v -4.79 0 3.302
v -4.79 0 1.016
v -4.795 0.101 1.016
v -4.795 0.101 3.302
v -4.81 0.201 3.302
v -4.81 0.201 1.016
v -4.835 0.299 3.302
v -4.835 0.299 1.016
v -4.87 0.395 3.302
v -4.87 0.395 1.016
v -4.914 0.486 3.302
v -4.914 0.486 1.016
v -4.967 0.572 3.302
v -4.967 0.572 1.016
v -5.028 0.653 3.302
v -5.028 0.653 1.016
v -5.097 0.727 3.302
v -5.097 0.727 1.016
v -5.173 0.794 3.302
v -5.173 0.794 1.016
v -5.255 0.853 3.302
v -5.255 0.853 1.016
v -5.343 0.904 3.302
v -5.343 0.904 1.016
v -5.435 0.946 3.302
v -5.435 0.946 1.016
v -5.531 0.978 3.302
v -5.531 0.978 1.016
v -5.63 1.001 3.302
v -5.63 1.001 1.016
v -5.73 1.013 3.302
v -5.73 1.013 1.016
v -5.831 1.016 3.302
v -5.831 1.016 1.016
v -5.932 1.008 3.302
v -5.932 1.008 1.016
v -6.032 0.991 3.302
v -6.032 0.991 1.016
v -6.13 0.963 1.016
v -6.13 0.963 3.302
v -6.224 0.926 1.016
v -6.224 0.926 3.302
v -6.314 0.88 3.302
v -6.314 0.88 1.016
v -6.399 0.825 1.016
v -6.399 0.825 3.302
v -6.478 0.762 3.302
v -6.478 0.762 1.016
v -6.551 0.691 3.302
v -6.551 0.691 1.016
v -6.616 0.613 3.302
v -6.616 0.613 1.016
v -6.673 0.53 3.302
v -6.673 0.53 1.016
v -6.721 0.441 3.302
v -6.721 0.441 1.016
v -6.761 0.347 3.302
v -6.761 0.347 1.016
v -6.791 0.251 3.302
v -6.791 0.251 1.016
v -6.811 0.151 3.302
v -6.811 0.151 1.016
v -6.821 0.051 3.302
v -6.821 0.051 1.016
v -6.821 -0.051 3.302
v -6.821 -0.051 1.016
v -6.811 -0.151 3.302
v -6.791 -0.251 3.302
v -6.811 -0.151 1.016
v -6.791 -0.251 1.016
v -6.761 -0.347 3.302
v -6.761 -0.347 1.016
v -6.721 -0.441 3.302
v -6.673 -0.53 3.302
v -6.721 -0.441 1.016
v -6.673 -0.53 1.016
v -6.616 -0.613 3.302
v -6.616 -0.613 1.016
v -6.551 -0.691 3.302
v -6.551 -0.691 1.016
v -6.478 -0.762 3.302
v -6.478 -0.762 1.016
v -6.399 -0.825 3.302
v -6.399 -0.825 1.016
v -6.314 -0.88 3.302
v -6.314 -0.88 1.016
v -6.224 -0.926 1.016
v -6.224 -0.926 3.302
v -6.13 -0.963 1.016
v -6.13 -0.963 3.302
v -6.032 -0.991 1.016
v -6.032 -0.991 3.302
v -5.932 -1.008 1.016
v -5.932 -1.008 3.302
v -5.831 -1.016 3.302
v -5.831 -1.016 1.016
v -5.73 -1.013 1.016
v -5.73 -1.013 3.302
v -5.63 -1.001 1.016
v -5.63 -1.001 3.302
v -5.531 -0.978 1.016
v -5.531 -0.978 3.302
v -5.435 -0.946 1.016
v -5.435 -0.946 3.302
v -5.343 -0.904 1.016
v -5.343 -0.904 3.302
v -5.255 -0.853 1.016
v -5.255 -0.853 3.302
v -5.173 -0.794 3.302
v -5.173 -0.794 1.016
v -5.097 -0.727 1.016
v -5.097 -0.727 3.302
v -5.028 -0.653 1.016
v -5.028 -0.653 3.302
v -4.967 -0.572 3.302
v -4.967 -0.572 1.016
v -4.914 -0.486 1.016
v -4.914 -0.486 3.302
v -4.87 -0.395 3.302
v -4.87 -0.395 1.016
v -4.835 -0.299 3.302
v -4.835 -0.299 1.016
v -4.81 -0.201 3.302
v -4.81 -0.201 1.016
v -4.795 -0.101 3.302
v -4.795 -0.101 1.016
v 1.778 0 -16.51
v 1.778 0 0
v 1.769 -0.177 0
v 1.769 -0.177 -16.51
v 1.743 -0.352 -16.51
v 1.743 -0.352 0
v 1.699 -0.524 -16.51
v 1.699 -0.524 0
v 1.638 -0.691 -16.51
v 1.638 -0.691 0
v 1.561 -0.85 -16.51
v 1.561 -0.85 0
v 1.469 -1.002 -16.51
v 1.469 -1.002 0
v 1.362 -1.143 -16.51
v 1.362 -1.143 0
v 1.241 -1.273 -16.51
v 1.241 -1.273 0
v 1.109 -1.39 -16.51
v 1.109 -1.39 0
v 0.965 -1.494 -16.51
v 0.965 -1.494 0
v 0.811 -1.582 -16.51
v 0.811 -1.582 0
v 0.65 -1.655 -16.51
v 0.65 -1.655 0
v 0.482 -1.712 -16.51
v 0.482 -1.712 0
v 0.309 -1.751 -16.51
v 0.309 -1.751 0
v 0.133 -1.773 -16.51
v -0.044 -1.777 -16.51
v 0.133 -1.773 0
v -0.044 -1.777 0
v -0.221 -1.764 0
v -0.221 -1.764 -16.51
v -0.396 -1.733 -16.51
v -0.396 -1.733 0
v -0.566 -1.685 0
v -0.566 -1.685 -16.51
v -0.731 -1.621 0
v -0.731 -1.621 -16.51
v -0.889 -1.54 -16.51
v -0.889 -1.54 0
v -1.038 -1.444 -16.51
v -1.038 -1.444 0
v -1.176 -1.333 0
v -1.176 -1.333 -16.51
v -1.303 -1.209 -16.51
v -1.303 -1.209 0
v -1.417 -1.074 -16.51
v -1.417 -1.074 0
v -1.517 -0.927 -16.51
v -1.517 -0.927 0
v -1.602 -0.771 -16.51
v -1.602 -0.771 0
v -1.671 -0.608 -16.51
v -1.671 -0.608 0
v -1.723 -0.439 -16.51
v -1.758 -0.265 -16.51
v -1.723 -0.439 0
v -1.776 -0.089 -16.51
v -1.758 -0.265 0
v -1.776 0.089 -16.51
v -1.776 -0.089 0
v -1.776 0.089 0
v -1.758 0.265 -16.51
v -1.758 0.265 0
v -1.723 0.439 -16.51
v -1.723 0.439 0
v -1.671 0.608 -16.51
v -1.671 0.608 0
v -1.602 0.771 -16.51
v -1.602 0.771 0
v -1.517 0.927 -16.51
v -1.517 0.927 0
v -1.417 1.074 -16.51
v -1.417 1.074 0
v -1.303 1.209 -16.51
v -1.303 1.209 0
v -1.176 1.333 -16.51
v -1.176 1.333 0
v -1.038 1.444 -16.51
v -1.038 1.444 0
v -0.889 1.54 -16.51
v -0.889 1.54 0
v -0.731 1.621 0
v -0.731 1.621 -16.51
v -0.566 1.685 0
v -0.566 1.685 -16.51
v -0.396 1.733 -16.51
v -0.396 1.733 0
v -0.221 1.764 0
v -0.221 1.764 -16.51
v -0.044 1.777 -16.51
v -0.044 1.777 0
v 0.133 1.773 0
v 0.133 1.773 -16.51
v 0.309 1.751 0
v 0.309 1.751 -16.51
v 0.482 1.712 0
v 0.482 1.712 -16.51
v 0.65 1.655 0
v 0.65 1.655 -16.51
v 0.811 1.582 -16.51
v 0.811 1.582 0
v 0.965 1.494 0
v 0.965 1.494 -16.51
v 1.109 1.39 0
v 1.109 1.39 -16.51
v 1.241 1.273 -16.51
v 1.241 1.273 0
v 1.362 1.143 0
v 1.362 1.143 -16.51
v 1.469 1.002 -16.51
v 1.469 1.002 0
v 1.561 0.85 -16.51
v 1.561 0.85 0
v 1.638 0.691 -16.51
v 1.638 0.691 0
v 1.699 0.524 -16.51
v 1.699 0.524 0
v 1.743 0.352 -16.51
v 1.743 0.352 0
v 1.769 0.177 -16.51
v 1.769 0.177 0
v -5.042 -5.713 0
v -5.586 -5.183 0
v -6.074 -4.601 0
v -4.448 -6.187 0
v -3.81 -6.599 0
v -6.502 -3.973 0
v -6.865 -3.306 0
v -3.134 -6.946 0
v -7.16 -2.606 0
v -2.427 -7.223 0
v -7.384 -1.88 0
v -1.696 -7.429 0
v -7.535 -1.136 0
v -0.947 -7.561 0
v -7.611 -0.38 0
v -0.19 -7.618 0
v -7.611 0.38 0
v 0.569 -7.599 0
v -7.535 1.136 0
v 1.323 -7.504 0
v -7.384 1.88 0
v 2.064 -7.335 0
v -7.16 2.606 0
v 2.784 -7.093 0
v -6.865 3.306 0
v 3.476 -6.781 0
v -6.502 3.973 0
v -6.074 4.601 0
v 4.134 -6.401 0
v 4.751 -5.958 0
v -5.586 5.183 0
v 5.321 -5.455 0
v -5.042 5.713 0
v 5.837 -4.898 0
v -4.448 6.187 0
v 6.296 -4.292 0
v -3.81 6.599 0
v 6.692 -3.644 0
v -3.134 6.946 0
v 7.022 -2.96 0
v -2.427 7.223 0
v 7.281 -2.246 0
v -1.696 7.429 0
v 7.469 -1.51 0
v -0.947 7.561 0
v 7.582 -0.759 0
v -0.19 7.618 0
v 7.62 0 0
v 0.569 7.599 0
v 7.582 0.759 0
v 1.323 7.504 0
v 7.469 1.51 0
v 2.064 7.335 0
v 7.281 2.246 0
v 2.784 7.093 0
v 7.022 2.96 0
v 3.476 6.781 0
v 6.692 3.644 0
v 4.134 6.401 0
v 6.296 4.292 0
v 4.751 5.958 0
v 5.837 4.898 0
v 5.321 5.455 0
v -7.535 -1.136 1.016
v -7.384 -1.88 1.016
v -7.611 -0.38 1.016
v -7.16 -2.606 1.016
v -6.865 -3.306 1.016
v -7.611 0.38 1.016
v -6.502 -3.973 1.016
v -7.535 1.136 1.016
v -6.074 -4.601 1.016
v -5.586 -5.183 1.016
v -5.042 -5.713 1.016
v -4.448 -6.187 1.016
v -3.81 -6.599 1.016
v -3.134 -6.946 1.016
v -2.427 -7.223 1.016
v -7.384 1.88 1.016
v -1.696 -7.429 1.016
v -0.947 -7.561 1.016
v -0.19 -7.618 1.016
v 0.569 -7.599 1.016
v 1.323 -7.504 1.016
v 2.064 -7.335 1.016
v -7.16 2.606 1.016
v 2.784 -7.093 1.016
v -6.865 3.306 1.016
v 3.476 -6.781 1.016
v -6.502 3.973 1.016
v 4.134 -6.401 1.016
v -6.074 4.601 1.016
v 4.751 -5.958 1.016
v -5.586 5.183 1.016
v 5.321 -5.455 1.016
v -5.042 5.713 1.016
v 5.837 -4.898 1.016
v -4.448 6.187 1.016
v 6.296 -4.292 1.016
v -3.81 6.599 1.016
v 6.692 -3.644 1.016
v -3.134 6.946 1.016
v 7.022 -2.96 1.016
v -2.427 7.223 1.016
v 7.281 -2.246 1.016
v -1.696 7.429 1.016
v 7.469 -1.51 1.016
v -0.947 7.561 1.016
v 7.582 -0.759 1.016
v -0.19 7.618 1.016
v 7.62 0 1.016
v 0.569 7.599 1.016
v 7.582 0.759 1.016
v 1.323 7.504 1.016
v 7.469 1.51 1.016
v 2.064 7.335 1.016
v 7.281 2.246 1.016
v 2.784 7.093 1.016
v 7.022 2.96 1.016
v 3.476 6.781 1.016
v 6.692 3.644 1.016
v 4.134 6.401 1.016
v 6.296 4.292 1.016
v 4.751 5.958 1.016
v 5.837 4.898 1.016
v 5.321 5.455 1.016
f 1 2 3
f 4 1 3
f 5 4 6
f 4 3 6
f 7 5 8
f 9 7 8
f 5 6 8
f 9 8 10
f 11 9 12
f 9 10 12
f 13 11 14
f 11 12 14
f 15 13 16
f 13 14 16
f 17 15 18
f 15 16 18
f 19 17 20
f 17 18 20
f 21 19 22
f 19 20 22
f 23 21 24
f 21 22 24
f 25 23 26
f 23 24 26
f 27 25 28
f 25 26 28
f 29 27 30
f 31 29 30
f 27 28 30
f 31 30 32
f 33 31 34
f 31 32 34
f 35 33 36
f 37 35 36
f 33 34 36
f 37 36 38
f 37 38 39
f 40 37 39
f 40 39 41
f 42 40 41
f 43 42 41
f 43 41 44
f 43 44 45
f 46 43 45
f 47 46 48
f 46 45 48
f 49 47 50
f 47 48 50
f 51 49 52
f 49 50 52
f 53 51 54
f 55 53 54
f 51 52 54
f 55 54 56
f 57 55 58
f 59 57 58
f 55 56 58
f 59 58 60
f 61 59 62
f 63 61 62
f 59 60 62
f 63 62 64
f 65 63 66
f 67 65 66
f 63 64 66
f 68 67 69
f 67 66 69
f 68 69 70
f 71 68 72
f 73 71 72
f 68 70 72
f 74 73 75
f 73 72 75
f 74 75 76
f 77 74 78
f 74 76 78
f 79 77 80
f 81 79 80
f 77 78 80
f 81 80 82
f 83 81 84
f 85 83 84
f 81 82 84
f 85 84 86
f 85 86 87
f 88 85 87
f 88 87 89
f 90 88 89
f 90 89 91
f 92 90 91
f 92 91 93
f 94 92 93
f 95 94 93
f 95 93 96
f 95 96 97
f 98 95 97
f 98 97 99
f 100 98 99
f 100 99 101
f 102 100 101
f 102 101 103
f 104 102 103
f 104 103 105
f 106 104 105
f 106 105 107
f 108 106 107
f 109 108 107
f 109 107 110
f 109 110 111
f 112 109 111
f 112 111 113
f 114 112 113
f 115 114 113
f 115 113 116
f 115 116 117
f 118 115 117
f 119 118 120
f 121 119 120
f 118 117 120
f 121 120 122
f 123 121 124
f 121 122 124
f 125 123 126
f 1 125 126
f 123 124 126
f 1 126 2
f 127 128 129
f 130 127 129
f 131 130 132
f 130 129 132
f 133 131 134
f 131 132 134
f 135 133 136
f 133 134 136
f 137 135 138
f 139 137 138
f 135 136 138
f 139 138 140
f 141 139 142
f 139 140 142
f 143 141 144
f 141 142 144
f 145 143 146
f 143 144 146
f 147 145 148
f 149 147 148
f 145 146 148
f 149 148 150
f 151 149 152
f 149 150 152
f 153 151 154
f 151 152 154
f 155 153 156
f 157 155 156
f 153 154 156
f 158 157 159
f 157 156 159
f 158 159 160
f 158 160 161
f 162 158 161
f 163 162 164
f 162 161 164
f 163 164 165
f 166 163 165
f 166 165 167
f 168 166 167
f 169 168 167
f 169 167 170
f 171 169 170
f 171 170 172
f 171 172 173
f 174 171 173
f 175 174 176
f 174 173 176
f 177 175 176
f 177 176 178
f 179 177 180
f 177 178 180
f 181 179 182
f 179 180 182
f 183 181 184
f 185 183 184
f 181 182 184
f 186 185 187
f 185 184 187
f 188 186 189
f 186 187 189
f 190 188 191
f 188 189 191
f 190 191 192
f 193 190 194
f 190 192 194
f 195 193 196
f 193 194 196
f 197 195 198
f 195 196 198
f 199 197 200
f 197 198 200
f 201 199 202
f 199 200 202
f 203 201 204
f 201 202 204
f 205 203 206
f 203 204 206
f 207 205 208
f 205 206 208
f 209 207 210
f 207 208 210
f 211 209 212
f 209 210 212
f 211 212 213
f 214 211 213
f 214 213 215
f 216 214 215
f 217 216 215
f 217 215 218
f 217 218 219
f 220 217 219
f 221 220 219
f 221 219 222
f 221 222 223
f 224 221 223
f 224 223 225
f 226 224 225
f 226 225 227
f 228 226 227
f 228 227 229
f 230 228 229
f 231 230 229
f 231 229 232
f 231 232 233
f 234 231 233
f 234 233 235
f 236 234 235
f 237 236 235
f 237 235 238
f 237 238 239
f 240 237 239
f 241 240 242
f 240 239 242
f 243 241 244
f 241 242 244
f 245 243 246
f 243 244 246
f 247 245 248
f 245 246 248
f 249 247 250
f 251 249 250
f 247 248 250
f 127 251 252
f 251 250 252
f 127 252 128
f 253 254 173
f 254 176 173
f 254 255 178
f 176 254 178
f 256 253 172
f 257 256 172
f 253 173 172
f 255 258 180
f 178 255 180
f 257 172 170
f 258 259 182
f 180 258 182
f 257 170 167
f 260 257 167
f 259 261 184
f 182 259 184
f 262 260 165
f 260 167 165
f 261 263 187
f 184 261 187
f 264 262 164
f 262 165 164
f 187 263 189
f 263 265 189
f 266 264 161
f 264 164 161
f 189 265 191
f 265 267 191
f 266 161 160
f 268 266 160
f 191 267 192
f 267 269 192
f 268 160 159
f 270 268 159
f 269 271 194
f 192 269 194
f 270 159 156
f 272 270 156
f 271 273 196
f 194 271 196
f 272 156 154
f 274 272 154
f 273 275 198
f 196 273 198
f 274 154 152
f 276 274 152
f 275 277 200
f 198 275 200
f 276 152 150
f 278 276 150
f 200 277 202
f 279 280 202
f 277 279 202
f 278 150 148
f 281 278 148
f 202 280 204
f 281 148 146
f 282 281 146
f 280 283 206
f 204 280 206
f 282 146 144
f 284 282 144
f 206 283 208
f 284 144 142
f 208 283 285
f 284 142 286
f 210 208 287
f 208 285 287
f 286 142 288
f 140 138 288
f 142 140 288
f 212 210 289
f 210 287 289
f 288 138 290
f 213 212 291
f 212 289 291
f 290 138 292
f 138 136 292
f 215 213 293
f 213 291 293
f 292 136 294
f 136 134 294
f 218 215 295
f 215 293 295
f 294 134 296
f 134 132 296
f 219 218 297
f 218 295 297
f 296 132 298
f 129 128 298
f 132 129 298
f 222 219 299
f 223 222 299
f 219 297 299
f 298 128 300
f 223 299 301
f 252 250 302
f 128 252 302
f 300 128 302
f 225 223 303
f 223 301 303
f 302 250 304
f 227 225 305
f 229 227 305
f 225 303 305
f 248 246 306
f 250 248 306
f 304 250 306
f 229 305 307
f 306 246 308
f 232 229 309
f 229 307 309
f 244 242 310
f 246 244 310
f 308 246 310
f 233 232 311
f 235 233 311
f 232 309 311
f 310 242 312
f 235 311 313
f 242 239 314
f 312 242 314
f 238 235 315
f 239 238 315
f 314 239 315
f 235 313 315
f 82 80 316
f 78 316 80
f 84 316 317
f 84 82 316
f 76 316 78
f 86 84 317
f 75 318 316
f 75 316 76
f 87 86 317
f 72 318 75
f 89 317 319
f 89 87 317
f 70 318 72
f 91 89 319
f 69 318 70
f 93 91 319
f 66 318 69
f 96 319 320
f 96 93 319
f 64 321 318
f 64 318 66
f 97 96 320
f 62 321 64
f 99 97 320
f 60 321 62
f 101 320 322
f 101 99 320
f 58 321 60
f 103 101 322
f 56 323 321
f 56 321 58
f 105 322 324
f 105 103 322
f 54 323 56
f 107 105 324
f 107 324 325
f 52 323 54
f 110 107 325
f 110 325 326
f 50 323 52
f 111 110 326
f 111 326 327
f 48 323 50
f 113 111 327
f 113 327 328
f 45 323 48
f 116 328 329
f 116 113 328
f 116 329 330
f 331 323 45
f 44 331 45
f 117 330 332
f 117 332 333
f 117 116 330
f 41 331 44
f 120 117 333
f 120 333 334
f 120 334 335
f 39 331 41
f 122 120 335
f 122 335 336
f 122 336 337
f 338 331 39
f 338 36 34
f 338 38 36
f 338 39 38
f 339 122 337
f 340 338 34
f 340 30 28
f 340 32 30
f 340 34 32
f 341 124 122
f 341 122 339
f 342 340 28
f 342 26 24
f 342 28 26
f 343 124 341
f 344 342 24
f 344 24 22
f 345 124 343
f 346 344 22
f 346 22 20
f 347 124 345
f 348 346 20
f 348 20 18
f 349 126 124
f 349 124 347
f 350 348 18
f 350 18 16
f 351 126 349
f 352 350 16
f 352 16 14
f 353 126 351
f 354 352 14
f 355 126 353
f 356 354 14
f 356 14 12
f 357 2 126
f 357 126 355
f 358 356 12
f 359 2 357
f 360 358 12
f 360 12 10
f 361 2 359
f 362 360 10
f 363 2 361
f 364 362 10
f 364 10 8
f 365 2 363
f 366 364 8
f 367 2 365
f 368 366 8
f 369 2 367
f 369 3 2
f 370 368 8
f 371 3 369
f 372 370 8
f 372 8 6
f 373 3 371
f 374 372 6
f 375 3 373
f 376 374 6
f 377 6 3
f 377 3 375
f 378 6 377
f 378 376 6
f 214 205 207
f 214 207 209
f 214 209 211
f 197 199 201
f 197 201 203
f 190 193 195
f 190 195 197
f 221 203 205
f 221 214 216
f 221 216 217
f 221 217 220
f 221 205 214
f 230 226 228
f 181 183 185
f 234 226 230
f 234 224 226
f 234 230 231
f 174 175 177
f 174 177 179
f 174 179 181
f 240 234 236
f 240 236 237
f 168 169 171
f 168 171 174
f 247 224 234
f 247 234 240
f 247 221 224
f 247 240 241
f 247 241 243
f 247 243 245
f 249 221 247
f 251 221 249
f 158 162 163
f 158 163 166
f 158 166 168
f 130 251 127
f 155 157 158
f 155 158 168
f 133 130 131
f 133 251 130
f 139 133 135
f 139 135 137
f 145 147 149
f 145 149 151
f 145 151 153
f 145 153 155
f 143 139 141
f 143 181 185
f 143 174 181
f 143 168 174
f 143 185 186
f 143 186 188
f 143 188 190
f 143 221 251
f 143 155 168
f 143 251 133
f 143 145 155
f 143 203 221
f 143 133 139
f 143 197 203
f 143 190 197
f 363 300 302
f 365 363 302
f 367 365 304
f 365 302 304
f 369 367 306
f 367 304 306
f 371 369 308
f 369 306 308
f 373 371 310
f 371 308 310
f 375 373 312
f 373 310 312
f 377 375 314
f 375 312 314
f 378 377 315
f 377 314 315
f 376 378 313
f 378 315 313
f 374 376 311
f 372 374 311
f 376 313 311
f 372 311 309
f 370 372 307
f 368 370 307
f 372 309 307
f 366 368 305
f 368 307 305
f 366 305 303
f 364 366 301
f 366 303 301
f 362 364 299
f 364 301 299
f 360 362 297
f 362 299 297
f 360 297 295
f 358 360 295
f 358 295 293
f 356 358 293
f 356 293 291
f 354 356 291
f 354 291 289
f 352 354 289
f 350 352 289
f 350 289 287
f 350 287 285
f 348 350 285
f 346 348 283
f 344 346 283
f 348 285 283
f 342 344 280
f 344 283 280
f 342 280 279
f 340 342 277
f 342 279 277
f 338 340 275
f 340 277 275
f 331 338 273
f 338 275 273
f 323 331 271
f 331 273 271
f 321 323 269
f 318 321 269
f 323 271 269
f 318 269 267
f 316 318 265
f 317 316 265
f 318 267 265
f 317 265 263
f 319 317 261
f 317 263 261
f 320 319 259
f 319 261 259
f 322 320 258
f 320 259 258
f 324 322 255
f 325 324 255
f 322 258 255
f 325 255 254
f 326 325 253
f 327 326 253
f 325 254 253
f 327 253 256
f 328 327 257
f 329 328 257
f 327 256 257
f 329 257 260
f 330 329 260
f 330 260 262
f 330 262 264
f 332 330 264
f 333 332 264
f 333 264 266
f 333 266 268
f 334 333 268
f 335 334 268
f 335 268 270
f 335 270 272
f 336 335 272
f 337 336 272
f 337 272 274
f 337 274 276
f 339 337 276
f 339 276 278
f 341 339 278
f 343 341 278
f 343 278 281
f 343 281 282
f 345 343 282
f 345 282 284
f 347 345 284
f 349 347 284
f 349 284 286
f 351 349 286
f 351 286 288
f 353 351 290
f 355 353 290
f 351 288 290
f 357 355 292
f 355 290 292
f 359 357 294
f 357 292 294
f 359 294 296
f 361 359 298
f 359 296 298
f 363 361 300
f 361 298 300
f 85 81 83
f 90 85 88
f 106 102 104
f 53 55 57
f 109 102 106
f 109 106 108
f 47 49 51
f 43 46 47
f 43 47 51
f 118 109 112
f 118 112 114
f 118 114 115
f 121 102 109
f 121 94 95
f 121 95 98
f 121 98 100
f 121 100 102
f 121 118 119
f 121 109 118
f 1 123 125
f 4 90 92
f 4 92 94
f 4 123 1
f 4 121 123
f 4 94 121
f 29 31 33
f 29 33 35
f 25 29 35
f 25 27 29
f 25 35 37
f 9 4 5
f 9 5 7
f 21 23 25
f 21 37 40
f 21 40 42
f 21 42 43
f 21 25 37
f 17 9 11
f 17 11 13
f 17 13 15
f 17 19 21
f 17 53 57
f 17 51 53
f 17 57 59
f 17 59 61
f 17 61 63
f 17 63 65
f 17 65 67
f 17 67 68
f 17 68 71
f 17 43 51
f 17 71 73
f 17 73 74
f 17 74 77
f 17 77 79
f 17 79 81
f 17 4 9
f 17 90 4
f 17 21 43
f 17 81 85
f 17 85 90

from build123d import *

# Parameters (mm, degrees)
F0_R     = 7.62
F1_DEPTH = 1.016
F2_R     = 1.016
F3_DEPTH = 2.286
F4_R     = 1.778
F5_DEPTH = 16.51


with BuildPart() as f1:
    # F0 (on Top) → F1 (new body)
    with BuildSketch(Plane.XY):
        Circle(F0_R)
    extrude(amount=F1_DEPTH)

    # F2 (on face) → F3 (join)
    with BuildSketch(Plane.XY.offset(1.016)):
        with Locations((-5.806038, 0)):
            Circle(F2_R)
    extrude(amount=F3_DEPTH)

    # F4 (on face) → F5 (join)
    with BuildSketch(Plane(origin=(0, 0, 0), x_dir=(1, 0, 0), z_dir=(0, 0, -1))):
        Circle(F4_R)
    extrude(amount=F5_DEPTH)


solid = f1.part
